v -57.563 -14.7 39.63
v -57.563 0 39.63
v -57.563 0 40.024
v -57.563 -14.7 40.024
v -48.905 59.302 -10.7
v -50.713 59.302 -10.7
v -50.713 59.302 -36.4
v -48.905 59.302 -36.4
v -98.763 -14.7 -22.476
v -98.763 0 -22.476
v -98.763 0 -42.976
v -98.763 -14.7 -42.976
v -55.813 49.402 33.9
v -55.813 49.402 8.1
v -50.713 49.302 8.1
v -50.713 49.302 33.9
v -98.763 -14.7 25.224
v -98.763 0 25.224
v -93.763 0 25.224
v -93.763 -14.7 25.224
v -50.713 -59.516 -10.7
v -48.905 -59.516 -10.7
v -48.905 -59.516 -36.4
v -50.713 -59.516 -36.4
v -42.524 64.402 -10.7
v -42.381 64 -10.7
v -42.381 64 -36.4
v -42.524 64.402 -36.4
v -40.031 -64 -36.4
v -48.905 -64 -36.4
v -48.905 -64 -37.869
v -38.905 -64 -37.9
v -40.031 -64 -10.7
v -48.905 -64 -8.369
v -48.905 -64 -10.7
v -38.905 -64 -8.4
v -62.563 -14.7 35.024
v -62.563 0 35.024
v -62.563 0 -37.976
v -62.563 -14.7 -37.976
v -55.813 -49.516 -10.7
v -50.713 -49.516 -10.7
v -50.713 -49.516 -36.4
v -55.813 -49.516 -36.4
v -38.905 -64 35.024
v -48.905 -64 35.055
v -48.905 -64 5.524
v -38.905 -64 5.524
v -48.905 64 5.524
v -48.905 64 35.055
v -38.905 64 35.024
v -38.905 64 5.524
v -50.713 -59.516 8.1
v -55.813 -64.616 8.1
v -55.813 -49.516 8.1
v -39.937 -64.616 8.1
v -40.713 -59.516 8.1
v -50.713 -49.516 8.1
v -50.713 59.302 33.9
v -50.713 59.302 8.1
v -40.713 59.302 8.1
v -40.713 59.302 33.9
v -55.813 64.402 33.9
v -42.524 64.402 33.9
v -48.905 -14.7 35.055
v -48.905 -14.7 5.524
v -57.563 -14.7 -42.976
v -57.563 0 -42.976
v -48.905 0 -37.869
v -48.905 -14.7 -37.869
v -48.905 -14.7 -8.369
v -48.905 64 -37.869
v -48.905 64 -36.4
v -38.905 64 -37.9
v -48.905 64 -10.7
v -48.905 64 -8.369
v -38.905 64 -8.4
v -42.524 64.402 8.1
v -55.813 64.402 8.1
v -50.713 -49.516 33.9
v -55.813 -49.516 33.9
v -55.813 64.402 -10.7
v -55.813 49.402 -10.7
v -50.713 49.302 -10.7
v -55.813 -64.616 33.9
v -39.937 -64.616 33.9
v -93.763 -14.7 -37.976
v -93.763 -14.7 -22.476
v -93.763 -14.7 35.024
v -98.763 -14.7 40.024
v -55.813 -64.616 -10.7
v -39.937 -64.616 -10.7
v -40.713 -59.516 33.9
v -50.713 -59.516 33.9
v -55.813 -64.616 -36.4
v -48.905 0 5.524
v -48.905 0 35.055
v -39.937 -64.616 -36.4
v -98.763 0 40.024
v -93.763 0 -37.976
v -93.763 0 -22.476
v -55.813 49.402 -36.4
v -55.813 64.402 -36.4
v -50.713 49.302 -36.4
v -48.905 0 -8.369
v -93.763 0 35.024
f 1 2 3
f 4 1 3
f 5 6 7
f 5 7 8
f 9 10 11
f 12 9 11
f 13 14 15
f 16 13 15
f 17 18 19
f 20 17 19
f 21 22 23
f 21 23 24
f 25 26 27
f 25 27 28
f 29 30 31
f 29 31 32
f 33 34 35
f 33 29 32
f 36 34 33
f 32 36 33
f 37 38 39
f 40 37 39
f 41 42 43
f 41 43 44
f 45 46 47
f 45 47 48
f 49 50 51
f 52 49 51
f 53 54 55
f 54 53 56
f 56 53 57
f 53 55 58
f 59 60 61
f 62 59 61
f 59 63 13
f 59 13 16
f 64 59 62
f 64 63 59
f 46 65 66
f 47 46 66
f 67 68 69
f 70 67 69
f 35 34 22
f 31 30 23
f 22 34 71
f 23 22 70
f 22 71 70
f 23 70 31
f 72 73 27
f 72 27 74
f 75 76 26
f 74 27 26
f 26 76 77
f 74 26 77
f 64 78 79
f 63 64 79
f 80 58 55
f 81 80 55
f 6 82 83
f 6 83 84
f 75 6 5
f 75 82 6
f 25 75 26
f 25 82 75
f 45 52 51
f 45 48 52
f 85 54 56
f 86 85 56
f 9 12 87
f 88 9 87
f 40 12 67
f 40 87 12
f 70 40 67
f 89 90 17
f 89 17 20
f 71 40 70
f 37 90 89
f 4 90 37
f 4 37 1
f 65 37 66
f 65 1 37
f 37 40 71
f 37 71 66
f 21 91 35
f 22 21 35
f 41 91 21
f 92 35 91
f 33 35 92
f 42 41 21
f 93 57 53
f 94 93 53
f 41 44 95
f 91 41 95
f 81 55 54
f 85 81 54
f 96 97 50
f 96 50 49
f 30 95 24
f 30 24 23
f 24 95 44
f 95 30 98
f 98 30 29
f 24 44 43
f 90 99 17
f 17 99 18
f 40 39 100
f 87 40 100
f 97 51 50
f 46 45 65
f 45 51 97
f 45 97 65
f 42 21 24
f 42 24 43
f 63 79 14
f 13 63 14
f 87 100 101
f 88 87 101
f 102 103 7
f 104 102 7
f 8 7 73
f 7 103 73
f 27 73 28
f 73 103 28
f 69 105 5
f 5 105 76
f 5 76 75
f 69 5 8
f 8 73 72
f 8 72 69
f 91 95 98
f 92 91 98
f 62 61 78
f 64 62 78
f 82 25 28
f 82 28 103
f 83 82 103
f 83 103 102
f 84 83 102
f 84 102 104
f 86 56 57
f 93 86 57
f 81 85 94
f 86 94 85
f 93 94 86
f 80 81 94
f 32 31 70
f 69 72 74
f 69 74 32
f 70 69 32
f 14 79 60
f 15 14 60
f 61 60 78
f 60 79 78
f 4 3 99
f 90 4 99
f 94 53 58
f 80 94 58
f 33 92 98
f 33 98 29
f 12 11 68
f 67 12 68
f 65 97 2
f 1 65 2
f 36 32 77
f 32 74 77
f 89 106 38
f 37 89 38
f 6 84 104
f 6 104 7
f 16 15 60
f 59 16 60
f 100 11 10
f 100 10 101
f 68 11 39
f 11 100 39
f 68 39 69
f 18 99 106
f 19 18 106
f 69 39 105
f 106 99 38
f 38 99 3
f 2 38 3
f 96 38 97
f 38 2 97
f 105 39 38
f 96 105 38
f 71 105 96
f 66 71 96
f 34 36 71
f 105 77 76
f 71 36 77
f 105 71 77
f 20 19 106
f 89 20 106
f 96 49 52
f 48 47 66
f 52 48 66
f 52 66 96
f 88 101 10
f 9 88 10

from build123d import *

# Parameters (mm, degrees)
F1_DEPTH = 14.7
F2_DEPTH = 64
F4_START = 8.1
F4_DEPTH = 25.8
F5_START = -10.7
F5_DEPTH = 25.7


with BuildPart() as f1:
    # F0 (on Front) → F1 (new body)
    with BuildSketch(Plane.XZ):
        Polygon((-57.5634558845, -37.8691852093), (-57.5634558845, -42.9755204436), (-48.9047467709, -37.8691852093), align=None)
        Polygon((-57.5634558845, 39.6298208652), (-57.5634558845, 35.0552275777), (-48.9047467709, 35.0552275777), align=None)
        Polygon((-62.5634558845, -37.9755204436), (-93.7634558845, -37.9755204436), (-93.7634558845, -22.4755204436), (-98.7634558845, -22.4755204436), (-98.7634558845, -42.9755204436), (-57.5634558845, -42.9755204436), (-57.5634558845, -37.8691852093), (-57.5634558845, 35.0552275777), (-57.5634558845, 39.6298208652), (-57.5634558845, 40.0244795564), (-98.7634558845, 40.0244795564), (-98.7634558845, 25.2244795564), (-93.7634558845, 25.2244795564), (-93.7634558845, 35.0244795564), (-62.5634558845, 35.0244795564), align=None)
        Polygon((-57.5634558845, 35.0552275777), (-57.5634558845, -37.8691852093), (-48.9047467709, -37.8691852093), (-48.9047467709, -8.3691852093), (-48.9047467709, 5.5244795564), (-48.9047467709, 35.0552275777), align=None)
    extrude(amount=F1_DEPTH)

    # F0 (on Front) → F2 (join, symmetric)
    with BuildSketch(Plane.XZ):
        Polygon((-48.9047467709, -8.3691852093), (-48.9047467709, -37.8691852093), (-38.904794043, -37.8999332305), (-38.904794043, -8.3999332305), align=None)
        Polygon((-38.904794043, 35.0244795564), (-48.9047467709, 35.0552275777), (-48.9047467709, 5.5244795564), (-38.904794043, 5.5244795564), align=None)
    extrude(amount=F2_DEPTH, both=True)

    # F3 (on Top) → F5 (join)
    with BuildSketch(Plane.XY.offset(F5_START)):
        Polygon((-39.9369911849, -64.6160170436), (-40.7134615421, -59.5160170436), (-50.7134615421, -59.5160170436), (-50.7134615421, -49.5160170436), (-55.8134615421, -49.5160163939), (-55.8134615421, -64.6160170436), align=None)
        Polygon((-50.7134615421, 59.3017010927), (-40.7134615421, 59.3017010927), (-42.5235800982, 64.4017010927), (-55.8134615421, 64.4017010927), (-55.8134615421, 49.4017010927), (-50.7134615421, 49.3017010927), align=None)
    extrude(amount=-F5_DEPTH)


with BuildPart() as f4:
    # F3 (on Top) → F4 (new body)
    with BuildSketch(Plane.XY.offset(F4_START)):
        Polygon((-50.7134615421, 59.3017010927), (-40.7134615421, 59.3017010927), (-42.5235800982, 64.4017010927), (-55.8134615421, 64.4017010927), (-55.8134615421, 49.4017010927), (-50.7134615421, 49.3017010927), align=None)
    extrude(amount=F4_DEPTH)


with BuildPart() as f4b:
    # F3 (on Top) → F4, piece 2 (new body)
    with BuildSketch(Plane.XY.offset(F4_START)):
        Polygon((-39.9369911849, -64.6160170436), (-40.7134615421, -59.5160170436), (-50.7134615421, -59.5160170436), (-50.7134615421, -49.5160170436), (-55.8134615421, -49.5160163939), (-55.8134615421, -64.6160170436), align=None)
    extrude(amount=F4_DEPTH)


solid = Compound([f1.part, f4.part, f4b.part])
